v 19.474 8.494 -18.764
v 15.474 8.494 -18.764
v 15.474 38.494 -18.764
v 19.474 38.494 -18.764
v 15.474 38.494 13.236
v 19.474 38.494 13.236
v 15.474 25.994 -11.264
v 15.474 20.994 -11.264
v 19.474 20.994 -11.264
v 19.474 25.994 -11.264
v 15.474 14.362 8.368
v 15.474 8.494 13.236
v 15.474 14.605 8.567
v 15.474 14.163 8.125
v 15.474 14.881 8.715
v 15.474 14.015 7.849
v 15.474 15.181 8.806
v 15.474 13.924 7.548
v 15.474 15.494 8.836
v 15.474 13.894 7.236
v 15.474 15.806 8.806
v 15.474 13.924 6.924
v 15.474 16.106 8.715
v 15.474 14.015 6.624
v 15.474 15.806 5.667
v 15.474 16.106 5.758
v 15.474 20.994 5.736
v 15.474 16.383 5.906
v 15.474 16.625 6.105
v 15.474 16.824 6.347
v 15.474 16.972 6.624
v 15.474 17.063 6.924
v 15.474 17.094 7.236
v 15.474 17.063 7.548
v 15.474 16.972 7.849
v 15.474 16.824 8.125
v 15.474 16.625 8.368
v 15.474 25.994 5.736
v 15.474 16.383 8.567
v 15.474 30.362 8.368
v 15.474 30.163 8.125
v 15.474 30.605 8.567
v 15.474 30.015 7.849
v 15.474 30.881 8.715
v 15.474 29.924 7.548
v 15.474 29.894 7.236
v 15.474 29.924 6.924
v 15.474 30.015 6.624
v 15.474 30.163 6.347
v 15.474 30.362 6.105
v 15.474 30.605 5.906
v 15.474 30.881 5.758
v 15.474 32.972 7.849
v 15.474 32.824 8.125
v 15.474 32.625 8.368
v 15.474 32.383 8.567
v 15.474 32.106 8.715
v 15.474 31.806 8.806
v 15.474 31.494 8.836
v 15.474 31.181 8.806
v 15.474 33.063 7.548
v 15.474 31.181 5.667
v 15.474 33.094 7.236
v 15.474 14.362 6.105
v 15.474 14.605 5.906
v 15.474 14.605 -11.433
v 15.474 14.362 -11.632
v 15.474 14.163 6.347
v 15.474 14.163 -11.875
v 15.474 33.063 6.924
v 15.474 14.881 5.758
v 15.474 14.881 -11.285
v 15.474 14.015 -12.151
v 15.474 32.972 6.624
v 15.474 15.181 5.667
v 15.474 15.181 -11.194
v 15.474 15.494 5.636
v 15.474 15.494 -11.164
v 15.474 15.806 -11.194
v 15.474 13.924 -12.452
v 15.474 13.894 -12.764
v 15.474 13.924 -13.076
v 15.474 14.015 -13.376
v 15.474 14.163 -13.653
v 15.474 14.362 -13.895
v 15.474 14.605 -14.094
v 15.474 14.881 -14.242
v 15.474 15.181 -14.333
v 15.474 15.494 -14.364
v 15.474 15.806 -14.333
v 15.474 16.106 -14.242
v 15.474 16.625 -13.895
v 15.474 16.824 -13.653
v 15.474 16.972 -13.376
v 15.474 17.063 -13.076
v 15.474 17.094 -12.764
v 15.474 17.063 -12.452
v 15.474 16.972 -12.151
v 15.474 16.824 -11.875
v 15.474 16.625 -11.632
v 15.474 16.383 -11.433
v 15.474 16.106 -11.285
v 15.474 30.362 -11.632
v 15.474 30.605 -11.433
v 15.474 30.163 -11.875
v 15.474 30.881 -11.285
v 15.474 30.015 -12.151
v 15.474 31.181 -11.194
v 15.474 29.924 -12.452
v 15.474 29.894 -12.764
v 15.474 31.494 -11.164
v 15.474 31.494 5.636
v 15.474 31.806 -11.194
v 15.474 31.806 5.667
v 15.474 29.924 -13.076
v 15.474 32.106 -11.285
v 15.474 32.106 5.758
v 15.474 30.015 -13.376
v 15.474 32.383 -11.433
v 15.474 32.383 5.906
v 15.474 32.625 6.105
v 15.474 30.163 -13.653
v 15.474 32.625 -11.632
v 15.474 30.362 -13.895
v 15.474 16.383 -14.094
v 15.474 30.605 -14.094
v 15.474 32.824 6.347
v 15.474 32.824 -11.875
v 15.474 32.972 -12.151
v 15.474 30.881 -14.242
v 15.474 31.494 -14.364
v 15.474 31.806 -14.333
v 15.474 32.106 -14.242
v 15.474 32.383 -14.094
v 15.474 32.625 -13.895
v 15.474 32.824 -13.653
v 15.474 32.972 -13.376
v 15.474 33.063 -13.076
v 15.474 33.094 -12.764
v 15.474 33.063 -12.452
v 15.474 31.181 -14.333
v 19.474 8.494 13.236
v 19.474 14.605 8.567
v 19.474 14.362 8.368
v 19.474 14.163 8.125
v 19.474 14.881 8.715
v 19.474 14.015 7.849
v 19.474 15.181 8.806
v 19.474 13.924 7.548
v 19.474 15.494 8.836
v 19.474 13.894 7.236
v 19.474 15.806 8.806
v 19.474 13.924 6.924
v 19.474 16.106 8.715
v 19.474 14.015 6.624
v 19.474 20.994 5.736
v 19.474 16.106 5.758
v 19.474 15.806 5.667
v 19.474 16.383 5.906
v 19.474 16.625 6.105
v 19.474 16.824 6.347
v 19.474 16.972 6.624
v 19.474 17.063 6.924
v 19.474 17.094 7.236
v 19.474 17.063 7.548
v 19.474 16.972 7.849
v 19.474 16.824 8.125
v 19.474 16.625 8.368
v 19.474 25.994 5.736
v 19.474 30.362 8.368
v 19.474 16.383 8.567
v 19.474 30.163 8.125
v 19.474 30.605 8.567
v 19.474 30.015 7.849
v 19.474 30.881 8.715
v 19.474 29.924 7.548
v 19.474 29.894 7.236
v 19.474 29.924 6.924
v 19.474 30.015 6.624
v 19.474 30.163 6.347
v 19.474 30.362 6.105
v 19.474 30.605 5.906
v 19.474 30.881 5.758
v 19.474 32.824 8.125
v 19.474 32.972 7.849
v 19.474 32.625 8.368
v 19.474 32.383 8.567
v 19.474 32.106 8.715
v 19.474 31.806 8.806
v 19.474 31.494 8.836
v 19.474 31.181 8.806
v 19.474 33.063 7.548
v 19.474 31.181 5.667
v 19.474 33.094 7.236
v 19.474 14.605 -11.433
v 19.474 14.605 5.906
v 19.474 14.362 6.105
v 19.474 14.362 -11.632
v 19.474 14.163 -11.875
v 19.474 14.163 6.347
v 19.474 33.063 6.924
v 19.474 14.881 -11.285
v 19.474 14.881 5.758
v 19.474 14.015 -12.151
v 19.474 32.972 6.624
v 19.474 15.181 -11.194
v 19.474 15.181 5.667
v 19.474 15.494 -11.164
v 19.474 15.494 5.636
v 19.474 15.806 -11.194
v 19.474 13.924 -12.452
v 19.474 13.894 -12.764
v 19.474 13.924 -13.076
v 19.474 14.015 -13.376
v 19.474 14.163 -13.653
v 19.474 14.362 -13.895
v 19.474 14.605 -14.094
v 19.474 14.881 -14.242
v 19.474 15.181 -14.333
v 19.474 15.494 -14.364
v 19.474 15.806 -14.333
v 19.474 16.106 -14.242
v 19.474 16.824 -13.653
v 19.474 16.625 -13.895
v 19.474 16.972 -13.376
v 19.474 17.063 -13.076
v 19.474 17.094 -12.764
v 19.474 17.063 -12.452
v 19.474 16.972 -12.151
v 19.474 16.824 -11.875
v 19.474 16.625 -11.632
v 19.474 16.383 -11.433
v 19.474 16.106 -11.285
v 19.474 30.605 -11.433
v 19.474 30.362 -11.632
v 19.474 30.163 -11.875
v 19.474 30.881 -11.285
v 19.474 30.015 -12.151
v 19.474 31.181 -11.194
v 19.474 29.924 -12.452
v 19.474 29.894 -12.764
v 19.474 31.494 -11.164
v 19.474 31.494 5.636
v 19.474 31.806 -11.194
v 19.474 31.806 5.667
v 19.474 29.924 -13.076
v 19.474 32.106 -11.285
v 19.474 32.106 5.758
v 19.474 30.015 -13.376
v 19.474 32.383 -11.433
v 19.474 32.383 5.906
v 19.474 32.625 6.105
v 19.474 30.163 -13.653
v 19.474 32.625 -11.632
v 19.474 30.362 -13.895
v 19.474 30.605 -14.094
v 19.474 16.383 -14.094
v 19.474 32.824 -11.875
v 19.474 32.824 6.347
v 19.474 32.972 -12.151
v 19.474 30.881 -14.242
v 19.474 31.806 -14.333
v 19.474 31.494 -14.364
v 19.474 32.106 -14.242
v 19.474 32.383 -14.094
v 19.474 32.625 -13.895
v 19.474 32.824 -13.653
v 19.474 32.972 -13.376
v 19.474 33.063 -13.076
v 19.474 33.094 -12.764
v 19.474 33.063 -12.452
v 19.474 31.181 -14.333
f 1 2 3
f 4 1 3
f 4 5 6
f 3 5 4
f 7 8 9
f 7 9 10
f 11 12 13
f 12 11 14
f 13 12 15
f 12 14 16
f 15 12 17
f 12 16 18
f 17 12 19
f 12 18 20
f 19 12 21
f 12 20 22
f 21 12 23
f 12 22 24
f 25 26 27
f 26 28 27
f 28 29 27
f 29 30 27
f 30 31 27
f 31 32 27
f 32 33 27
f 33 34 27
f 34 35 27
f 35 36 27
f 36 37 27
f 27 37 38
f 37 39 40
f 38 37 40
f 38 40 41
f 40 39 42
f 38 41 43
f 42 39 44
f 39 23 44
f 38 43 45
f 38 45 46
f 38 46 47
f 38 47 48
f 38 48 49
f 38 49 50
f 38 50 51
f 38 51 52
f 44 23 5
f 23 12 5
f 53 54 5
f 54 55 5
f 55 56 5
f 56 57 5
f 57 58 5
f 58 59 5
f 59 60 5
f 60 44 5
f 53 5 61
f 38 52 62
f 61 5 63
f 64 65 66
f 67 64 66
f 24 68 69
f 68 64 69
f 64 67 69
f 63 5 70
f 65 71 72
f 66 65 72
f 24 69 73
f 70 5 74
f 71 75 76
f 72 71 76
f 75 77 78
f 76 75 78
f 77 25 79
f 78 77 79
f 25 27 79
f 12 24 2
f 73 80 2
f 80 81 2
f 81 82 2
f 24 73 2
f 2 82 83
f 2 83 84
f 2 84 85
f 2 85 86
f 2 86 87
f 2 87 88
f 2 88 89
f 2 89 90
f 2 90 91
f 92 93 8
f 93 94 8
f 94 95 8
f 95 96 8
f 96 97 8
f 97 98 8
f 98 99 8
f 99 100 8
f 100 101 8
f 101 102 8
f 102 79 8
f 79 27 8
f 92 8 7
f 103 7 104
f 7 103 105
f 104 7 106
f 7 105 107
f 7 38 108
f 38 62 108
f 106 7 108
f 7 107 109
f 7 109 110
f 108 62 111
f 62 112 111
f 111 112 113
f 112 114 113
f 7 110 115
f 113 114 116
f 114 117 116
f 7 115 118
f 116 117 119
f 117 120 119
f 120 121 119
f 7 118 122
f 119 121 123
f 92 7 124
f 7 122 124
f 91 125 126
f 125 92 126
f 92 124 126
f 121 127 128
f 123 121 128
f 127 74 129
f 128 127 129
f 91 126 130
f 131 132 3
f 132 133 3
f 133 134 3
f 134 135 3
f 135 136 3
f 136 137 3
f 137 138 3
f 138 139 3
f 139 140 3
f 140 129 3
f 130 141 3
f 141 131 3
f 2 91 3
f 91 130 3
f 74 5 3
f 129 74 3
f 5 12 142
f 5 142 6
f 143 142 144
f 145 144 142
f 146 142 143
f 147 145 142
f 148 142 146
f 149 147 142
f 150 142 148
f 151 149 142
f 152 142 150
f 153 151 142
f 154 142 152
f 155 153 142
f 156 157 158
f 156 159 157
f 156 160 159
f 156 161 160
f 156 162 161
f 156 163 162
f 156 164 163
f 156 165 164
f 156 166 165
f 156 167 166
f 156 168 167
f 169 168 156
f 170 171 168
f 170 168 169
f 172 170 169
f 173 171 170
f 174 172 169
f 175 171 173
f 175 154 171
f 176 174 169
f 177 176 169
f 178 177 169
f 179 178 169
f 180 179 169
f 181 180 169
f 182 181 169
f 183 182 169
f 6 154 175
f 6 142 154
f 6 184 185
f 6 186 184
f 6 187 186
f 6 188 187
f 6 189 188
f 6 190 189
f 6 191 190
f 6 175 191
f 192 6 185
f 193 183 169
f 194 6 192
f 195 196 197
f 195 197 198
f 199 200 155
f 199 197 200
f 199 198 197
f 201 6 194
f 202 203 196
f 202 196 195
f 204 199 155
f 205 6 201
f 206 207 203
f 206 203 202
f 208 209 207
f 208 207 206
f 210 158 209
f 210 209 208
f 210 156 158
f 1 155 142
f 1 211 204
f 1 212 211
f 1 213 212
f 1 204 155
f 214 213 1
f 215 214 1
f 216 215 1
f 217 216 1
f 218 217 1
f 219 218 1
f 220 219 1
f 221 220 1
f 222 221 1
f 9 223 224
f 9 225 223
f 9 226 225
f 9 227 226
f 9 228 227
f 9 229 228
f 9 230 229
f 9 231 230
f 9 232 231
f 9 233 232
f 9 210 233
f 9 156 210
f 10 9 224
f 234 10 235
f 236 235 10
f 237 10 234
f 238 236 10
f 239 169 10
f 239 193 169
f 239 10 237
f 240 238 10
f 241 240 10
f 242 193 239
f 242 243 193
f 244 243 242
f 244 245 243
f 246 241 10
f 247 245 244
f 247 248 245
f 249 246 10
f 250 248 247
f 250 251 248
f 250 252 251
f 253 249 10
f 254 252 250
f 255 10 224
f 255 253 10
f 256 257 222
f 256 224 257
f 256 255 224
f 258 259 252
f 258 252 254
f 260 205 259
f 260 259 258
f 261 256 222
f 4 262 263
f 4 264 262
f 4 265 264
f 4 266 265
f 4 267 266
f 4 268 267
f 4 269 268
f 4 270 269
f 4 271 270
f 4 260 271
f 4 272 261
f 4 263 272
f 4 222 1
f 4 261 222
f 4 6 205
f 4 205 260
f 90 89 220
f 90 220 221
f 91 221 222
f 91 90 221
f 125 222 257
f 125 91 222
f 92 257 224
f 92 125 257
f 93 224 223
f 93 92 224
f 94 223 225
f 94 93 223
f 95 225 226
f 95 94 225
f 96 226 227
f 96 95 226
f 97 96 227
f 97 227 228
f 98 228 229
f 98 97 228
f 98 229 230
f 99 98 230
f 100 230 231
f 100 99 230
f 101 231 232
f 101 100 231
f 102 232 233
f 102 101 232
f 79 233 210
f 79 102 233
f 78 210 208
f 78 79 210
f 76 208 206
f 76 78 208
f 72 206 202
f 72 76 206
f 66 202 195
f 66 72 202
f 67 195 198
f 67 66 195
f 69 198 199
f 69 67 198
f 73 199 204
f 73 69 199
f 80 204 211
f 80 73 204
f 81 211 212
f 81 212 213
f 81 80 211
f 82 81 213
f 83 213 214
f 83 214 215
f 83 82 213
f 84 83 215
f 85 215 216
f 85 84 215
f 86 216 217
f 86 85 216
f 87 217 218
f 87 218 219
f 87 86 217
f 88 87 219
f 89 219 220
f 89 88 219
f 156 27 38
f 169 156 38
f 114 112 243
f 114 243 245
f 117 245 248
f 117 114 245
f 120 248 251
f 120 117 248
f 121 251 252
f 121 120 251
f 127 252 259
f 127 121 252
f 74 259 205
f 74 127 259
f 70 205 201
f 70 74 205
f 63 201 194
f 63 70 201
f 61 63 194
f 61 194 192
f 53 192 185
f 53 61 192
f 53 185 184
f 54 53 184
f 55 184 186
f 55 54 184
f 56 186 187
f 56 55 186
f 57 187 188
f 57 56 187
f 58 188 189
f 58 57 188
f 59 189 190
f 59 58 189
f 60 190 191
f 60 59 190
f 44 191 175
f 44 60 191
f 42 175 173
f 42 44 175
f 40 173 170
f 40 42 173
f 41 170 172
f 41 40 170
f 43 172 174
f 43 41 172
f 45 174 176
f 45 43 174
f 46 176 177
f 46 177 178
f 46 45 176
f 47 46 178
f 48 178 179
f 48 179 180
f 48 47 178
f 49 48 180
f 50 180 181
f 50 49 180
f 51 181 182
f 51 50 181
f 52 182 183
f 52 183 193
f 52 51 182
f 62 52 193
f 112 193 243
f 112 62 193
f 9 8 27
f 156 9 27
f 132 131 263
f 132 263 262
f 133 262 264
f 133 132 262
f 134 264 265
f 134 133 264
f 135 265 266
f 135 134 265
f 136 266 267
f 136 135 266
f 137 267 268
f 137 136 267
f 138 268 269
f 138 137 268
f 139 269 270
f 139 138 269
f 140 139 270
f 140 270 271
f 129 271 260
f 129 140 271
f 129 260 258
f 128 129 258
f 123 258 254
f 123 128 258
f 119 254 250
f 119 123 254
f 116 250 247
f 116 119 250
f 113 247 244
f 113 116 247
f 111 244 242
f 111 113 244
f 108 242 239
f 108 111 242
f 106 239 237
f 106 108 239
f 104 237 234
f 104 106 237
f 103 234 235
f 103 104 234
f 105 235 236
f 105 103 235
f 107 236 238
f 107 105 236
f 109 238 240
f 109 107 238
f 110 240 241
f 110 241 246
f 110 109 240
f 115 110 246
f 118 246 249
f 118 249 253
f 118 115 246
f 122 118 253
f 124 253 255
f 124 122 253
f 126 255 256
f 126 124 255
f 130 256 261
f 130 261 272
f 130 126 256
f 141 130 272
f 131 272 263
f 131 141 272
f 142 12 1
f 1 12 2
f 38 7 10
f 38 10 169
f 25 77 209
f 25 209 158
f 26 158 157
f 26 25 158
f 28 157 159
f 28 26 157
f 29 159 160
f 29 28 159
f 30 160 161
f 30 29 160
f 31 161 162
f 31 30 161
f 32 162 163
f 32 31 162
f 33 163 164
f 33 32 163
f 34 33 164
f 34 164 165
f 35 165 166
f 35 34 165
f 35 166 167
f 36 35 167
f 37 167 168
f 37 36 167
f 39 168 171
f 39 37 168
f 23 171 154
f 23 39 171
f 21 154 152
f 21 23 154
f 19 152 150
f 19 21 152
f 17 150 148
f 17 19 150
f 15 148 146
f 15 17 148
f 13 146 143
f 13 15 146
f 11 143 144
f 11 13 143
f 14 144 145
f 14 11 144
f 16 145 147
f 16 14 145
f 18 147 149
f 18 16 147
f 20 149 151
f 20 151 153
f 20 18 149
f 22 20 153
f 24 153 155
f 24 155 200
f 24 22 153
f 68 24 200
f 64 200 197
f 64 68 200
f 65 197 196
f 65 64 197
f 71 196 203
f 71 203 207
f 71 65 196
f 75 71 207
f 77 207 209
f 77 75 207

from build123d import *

# Parameters (mm, degrees)
SKETCH_1_W         = 32
SKETCH_1_H         = 30
SKETCH_1_R         = 1.6
EXTRUDE_1_DEPTH    = 4
SKETCH2_W          = 17
SKETCH2_H          = 5
CUT_EXTRUDE2_DEPTH = 5


with BuildPart() as part:
    # Эскиз1 → Бобышка-Вытянуть1 (new body)
    with BuildSketch(Plane(origin=(15.473923778, 0, 0), x_dir=(0, 0, -1), z_dir=(1, 0, 0))):
        with Locations((2.763696673, 23.493617857)):
            Rectangle(SKETCH_1_W, SKETCH_1_H)
        with Locations((-7.236303327, 31.493617857)):
            Circle(SKETCH_1_R, mode=Mode.SUBTRACT)
        with Locations((12.763696673, 31.493617857)):
            Circle(SKETCH_1_R, mode=Mode.SUBTRACT)
        with Locations((-7.236303327, 15.493617857)):
            Circle(SKETCH_1_R, mode=Mode.SUBTRACT)
        with Locations((12.763696673, 15.493617857)):
            Circle(SKETCH_1_R, mode=Mode.SUBTRACT)
    extrude(amount=EXTRUDE_1_DEPTH)

    # Sketch2 → Cut-Extrude2 (cut, through all)
    with BuildSketch(Plane.ZY.offset(-15.473923778)):
        with Locations((-2.763696673, 23.493617857)):
            Rectangle(SKETCH2_W, SKETCH2_H)
    extrude(amount=-CUT_EXTRUDE2_DEPTH, mode=Mode.SUBTRACT)


solid = part.part
